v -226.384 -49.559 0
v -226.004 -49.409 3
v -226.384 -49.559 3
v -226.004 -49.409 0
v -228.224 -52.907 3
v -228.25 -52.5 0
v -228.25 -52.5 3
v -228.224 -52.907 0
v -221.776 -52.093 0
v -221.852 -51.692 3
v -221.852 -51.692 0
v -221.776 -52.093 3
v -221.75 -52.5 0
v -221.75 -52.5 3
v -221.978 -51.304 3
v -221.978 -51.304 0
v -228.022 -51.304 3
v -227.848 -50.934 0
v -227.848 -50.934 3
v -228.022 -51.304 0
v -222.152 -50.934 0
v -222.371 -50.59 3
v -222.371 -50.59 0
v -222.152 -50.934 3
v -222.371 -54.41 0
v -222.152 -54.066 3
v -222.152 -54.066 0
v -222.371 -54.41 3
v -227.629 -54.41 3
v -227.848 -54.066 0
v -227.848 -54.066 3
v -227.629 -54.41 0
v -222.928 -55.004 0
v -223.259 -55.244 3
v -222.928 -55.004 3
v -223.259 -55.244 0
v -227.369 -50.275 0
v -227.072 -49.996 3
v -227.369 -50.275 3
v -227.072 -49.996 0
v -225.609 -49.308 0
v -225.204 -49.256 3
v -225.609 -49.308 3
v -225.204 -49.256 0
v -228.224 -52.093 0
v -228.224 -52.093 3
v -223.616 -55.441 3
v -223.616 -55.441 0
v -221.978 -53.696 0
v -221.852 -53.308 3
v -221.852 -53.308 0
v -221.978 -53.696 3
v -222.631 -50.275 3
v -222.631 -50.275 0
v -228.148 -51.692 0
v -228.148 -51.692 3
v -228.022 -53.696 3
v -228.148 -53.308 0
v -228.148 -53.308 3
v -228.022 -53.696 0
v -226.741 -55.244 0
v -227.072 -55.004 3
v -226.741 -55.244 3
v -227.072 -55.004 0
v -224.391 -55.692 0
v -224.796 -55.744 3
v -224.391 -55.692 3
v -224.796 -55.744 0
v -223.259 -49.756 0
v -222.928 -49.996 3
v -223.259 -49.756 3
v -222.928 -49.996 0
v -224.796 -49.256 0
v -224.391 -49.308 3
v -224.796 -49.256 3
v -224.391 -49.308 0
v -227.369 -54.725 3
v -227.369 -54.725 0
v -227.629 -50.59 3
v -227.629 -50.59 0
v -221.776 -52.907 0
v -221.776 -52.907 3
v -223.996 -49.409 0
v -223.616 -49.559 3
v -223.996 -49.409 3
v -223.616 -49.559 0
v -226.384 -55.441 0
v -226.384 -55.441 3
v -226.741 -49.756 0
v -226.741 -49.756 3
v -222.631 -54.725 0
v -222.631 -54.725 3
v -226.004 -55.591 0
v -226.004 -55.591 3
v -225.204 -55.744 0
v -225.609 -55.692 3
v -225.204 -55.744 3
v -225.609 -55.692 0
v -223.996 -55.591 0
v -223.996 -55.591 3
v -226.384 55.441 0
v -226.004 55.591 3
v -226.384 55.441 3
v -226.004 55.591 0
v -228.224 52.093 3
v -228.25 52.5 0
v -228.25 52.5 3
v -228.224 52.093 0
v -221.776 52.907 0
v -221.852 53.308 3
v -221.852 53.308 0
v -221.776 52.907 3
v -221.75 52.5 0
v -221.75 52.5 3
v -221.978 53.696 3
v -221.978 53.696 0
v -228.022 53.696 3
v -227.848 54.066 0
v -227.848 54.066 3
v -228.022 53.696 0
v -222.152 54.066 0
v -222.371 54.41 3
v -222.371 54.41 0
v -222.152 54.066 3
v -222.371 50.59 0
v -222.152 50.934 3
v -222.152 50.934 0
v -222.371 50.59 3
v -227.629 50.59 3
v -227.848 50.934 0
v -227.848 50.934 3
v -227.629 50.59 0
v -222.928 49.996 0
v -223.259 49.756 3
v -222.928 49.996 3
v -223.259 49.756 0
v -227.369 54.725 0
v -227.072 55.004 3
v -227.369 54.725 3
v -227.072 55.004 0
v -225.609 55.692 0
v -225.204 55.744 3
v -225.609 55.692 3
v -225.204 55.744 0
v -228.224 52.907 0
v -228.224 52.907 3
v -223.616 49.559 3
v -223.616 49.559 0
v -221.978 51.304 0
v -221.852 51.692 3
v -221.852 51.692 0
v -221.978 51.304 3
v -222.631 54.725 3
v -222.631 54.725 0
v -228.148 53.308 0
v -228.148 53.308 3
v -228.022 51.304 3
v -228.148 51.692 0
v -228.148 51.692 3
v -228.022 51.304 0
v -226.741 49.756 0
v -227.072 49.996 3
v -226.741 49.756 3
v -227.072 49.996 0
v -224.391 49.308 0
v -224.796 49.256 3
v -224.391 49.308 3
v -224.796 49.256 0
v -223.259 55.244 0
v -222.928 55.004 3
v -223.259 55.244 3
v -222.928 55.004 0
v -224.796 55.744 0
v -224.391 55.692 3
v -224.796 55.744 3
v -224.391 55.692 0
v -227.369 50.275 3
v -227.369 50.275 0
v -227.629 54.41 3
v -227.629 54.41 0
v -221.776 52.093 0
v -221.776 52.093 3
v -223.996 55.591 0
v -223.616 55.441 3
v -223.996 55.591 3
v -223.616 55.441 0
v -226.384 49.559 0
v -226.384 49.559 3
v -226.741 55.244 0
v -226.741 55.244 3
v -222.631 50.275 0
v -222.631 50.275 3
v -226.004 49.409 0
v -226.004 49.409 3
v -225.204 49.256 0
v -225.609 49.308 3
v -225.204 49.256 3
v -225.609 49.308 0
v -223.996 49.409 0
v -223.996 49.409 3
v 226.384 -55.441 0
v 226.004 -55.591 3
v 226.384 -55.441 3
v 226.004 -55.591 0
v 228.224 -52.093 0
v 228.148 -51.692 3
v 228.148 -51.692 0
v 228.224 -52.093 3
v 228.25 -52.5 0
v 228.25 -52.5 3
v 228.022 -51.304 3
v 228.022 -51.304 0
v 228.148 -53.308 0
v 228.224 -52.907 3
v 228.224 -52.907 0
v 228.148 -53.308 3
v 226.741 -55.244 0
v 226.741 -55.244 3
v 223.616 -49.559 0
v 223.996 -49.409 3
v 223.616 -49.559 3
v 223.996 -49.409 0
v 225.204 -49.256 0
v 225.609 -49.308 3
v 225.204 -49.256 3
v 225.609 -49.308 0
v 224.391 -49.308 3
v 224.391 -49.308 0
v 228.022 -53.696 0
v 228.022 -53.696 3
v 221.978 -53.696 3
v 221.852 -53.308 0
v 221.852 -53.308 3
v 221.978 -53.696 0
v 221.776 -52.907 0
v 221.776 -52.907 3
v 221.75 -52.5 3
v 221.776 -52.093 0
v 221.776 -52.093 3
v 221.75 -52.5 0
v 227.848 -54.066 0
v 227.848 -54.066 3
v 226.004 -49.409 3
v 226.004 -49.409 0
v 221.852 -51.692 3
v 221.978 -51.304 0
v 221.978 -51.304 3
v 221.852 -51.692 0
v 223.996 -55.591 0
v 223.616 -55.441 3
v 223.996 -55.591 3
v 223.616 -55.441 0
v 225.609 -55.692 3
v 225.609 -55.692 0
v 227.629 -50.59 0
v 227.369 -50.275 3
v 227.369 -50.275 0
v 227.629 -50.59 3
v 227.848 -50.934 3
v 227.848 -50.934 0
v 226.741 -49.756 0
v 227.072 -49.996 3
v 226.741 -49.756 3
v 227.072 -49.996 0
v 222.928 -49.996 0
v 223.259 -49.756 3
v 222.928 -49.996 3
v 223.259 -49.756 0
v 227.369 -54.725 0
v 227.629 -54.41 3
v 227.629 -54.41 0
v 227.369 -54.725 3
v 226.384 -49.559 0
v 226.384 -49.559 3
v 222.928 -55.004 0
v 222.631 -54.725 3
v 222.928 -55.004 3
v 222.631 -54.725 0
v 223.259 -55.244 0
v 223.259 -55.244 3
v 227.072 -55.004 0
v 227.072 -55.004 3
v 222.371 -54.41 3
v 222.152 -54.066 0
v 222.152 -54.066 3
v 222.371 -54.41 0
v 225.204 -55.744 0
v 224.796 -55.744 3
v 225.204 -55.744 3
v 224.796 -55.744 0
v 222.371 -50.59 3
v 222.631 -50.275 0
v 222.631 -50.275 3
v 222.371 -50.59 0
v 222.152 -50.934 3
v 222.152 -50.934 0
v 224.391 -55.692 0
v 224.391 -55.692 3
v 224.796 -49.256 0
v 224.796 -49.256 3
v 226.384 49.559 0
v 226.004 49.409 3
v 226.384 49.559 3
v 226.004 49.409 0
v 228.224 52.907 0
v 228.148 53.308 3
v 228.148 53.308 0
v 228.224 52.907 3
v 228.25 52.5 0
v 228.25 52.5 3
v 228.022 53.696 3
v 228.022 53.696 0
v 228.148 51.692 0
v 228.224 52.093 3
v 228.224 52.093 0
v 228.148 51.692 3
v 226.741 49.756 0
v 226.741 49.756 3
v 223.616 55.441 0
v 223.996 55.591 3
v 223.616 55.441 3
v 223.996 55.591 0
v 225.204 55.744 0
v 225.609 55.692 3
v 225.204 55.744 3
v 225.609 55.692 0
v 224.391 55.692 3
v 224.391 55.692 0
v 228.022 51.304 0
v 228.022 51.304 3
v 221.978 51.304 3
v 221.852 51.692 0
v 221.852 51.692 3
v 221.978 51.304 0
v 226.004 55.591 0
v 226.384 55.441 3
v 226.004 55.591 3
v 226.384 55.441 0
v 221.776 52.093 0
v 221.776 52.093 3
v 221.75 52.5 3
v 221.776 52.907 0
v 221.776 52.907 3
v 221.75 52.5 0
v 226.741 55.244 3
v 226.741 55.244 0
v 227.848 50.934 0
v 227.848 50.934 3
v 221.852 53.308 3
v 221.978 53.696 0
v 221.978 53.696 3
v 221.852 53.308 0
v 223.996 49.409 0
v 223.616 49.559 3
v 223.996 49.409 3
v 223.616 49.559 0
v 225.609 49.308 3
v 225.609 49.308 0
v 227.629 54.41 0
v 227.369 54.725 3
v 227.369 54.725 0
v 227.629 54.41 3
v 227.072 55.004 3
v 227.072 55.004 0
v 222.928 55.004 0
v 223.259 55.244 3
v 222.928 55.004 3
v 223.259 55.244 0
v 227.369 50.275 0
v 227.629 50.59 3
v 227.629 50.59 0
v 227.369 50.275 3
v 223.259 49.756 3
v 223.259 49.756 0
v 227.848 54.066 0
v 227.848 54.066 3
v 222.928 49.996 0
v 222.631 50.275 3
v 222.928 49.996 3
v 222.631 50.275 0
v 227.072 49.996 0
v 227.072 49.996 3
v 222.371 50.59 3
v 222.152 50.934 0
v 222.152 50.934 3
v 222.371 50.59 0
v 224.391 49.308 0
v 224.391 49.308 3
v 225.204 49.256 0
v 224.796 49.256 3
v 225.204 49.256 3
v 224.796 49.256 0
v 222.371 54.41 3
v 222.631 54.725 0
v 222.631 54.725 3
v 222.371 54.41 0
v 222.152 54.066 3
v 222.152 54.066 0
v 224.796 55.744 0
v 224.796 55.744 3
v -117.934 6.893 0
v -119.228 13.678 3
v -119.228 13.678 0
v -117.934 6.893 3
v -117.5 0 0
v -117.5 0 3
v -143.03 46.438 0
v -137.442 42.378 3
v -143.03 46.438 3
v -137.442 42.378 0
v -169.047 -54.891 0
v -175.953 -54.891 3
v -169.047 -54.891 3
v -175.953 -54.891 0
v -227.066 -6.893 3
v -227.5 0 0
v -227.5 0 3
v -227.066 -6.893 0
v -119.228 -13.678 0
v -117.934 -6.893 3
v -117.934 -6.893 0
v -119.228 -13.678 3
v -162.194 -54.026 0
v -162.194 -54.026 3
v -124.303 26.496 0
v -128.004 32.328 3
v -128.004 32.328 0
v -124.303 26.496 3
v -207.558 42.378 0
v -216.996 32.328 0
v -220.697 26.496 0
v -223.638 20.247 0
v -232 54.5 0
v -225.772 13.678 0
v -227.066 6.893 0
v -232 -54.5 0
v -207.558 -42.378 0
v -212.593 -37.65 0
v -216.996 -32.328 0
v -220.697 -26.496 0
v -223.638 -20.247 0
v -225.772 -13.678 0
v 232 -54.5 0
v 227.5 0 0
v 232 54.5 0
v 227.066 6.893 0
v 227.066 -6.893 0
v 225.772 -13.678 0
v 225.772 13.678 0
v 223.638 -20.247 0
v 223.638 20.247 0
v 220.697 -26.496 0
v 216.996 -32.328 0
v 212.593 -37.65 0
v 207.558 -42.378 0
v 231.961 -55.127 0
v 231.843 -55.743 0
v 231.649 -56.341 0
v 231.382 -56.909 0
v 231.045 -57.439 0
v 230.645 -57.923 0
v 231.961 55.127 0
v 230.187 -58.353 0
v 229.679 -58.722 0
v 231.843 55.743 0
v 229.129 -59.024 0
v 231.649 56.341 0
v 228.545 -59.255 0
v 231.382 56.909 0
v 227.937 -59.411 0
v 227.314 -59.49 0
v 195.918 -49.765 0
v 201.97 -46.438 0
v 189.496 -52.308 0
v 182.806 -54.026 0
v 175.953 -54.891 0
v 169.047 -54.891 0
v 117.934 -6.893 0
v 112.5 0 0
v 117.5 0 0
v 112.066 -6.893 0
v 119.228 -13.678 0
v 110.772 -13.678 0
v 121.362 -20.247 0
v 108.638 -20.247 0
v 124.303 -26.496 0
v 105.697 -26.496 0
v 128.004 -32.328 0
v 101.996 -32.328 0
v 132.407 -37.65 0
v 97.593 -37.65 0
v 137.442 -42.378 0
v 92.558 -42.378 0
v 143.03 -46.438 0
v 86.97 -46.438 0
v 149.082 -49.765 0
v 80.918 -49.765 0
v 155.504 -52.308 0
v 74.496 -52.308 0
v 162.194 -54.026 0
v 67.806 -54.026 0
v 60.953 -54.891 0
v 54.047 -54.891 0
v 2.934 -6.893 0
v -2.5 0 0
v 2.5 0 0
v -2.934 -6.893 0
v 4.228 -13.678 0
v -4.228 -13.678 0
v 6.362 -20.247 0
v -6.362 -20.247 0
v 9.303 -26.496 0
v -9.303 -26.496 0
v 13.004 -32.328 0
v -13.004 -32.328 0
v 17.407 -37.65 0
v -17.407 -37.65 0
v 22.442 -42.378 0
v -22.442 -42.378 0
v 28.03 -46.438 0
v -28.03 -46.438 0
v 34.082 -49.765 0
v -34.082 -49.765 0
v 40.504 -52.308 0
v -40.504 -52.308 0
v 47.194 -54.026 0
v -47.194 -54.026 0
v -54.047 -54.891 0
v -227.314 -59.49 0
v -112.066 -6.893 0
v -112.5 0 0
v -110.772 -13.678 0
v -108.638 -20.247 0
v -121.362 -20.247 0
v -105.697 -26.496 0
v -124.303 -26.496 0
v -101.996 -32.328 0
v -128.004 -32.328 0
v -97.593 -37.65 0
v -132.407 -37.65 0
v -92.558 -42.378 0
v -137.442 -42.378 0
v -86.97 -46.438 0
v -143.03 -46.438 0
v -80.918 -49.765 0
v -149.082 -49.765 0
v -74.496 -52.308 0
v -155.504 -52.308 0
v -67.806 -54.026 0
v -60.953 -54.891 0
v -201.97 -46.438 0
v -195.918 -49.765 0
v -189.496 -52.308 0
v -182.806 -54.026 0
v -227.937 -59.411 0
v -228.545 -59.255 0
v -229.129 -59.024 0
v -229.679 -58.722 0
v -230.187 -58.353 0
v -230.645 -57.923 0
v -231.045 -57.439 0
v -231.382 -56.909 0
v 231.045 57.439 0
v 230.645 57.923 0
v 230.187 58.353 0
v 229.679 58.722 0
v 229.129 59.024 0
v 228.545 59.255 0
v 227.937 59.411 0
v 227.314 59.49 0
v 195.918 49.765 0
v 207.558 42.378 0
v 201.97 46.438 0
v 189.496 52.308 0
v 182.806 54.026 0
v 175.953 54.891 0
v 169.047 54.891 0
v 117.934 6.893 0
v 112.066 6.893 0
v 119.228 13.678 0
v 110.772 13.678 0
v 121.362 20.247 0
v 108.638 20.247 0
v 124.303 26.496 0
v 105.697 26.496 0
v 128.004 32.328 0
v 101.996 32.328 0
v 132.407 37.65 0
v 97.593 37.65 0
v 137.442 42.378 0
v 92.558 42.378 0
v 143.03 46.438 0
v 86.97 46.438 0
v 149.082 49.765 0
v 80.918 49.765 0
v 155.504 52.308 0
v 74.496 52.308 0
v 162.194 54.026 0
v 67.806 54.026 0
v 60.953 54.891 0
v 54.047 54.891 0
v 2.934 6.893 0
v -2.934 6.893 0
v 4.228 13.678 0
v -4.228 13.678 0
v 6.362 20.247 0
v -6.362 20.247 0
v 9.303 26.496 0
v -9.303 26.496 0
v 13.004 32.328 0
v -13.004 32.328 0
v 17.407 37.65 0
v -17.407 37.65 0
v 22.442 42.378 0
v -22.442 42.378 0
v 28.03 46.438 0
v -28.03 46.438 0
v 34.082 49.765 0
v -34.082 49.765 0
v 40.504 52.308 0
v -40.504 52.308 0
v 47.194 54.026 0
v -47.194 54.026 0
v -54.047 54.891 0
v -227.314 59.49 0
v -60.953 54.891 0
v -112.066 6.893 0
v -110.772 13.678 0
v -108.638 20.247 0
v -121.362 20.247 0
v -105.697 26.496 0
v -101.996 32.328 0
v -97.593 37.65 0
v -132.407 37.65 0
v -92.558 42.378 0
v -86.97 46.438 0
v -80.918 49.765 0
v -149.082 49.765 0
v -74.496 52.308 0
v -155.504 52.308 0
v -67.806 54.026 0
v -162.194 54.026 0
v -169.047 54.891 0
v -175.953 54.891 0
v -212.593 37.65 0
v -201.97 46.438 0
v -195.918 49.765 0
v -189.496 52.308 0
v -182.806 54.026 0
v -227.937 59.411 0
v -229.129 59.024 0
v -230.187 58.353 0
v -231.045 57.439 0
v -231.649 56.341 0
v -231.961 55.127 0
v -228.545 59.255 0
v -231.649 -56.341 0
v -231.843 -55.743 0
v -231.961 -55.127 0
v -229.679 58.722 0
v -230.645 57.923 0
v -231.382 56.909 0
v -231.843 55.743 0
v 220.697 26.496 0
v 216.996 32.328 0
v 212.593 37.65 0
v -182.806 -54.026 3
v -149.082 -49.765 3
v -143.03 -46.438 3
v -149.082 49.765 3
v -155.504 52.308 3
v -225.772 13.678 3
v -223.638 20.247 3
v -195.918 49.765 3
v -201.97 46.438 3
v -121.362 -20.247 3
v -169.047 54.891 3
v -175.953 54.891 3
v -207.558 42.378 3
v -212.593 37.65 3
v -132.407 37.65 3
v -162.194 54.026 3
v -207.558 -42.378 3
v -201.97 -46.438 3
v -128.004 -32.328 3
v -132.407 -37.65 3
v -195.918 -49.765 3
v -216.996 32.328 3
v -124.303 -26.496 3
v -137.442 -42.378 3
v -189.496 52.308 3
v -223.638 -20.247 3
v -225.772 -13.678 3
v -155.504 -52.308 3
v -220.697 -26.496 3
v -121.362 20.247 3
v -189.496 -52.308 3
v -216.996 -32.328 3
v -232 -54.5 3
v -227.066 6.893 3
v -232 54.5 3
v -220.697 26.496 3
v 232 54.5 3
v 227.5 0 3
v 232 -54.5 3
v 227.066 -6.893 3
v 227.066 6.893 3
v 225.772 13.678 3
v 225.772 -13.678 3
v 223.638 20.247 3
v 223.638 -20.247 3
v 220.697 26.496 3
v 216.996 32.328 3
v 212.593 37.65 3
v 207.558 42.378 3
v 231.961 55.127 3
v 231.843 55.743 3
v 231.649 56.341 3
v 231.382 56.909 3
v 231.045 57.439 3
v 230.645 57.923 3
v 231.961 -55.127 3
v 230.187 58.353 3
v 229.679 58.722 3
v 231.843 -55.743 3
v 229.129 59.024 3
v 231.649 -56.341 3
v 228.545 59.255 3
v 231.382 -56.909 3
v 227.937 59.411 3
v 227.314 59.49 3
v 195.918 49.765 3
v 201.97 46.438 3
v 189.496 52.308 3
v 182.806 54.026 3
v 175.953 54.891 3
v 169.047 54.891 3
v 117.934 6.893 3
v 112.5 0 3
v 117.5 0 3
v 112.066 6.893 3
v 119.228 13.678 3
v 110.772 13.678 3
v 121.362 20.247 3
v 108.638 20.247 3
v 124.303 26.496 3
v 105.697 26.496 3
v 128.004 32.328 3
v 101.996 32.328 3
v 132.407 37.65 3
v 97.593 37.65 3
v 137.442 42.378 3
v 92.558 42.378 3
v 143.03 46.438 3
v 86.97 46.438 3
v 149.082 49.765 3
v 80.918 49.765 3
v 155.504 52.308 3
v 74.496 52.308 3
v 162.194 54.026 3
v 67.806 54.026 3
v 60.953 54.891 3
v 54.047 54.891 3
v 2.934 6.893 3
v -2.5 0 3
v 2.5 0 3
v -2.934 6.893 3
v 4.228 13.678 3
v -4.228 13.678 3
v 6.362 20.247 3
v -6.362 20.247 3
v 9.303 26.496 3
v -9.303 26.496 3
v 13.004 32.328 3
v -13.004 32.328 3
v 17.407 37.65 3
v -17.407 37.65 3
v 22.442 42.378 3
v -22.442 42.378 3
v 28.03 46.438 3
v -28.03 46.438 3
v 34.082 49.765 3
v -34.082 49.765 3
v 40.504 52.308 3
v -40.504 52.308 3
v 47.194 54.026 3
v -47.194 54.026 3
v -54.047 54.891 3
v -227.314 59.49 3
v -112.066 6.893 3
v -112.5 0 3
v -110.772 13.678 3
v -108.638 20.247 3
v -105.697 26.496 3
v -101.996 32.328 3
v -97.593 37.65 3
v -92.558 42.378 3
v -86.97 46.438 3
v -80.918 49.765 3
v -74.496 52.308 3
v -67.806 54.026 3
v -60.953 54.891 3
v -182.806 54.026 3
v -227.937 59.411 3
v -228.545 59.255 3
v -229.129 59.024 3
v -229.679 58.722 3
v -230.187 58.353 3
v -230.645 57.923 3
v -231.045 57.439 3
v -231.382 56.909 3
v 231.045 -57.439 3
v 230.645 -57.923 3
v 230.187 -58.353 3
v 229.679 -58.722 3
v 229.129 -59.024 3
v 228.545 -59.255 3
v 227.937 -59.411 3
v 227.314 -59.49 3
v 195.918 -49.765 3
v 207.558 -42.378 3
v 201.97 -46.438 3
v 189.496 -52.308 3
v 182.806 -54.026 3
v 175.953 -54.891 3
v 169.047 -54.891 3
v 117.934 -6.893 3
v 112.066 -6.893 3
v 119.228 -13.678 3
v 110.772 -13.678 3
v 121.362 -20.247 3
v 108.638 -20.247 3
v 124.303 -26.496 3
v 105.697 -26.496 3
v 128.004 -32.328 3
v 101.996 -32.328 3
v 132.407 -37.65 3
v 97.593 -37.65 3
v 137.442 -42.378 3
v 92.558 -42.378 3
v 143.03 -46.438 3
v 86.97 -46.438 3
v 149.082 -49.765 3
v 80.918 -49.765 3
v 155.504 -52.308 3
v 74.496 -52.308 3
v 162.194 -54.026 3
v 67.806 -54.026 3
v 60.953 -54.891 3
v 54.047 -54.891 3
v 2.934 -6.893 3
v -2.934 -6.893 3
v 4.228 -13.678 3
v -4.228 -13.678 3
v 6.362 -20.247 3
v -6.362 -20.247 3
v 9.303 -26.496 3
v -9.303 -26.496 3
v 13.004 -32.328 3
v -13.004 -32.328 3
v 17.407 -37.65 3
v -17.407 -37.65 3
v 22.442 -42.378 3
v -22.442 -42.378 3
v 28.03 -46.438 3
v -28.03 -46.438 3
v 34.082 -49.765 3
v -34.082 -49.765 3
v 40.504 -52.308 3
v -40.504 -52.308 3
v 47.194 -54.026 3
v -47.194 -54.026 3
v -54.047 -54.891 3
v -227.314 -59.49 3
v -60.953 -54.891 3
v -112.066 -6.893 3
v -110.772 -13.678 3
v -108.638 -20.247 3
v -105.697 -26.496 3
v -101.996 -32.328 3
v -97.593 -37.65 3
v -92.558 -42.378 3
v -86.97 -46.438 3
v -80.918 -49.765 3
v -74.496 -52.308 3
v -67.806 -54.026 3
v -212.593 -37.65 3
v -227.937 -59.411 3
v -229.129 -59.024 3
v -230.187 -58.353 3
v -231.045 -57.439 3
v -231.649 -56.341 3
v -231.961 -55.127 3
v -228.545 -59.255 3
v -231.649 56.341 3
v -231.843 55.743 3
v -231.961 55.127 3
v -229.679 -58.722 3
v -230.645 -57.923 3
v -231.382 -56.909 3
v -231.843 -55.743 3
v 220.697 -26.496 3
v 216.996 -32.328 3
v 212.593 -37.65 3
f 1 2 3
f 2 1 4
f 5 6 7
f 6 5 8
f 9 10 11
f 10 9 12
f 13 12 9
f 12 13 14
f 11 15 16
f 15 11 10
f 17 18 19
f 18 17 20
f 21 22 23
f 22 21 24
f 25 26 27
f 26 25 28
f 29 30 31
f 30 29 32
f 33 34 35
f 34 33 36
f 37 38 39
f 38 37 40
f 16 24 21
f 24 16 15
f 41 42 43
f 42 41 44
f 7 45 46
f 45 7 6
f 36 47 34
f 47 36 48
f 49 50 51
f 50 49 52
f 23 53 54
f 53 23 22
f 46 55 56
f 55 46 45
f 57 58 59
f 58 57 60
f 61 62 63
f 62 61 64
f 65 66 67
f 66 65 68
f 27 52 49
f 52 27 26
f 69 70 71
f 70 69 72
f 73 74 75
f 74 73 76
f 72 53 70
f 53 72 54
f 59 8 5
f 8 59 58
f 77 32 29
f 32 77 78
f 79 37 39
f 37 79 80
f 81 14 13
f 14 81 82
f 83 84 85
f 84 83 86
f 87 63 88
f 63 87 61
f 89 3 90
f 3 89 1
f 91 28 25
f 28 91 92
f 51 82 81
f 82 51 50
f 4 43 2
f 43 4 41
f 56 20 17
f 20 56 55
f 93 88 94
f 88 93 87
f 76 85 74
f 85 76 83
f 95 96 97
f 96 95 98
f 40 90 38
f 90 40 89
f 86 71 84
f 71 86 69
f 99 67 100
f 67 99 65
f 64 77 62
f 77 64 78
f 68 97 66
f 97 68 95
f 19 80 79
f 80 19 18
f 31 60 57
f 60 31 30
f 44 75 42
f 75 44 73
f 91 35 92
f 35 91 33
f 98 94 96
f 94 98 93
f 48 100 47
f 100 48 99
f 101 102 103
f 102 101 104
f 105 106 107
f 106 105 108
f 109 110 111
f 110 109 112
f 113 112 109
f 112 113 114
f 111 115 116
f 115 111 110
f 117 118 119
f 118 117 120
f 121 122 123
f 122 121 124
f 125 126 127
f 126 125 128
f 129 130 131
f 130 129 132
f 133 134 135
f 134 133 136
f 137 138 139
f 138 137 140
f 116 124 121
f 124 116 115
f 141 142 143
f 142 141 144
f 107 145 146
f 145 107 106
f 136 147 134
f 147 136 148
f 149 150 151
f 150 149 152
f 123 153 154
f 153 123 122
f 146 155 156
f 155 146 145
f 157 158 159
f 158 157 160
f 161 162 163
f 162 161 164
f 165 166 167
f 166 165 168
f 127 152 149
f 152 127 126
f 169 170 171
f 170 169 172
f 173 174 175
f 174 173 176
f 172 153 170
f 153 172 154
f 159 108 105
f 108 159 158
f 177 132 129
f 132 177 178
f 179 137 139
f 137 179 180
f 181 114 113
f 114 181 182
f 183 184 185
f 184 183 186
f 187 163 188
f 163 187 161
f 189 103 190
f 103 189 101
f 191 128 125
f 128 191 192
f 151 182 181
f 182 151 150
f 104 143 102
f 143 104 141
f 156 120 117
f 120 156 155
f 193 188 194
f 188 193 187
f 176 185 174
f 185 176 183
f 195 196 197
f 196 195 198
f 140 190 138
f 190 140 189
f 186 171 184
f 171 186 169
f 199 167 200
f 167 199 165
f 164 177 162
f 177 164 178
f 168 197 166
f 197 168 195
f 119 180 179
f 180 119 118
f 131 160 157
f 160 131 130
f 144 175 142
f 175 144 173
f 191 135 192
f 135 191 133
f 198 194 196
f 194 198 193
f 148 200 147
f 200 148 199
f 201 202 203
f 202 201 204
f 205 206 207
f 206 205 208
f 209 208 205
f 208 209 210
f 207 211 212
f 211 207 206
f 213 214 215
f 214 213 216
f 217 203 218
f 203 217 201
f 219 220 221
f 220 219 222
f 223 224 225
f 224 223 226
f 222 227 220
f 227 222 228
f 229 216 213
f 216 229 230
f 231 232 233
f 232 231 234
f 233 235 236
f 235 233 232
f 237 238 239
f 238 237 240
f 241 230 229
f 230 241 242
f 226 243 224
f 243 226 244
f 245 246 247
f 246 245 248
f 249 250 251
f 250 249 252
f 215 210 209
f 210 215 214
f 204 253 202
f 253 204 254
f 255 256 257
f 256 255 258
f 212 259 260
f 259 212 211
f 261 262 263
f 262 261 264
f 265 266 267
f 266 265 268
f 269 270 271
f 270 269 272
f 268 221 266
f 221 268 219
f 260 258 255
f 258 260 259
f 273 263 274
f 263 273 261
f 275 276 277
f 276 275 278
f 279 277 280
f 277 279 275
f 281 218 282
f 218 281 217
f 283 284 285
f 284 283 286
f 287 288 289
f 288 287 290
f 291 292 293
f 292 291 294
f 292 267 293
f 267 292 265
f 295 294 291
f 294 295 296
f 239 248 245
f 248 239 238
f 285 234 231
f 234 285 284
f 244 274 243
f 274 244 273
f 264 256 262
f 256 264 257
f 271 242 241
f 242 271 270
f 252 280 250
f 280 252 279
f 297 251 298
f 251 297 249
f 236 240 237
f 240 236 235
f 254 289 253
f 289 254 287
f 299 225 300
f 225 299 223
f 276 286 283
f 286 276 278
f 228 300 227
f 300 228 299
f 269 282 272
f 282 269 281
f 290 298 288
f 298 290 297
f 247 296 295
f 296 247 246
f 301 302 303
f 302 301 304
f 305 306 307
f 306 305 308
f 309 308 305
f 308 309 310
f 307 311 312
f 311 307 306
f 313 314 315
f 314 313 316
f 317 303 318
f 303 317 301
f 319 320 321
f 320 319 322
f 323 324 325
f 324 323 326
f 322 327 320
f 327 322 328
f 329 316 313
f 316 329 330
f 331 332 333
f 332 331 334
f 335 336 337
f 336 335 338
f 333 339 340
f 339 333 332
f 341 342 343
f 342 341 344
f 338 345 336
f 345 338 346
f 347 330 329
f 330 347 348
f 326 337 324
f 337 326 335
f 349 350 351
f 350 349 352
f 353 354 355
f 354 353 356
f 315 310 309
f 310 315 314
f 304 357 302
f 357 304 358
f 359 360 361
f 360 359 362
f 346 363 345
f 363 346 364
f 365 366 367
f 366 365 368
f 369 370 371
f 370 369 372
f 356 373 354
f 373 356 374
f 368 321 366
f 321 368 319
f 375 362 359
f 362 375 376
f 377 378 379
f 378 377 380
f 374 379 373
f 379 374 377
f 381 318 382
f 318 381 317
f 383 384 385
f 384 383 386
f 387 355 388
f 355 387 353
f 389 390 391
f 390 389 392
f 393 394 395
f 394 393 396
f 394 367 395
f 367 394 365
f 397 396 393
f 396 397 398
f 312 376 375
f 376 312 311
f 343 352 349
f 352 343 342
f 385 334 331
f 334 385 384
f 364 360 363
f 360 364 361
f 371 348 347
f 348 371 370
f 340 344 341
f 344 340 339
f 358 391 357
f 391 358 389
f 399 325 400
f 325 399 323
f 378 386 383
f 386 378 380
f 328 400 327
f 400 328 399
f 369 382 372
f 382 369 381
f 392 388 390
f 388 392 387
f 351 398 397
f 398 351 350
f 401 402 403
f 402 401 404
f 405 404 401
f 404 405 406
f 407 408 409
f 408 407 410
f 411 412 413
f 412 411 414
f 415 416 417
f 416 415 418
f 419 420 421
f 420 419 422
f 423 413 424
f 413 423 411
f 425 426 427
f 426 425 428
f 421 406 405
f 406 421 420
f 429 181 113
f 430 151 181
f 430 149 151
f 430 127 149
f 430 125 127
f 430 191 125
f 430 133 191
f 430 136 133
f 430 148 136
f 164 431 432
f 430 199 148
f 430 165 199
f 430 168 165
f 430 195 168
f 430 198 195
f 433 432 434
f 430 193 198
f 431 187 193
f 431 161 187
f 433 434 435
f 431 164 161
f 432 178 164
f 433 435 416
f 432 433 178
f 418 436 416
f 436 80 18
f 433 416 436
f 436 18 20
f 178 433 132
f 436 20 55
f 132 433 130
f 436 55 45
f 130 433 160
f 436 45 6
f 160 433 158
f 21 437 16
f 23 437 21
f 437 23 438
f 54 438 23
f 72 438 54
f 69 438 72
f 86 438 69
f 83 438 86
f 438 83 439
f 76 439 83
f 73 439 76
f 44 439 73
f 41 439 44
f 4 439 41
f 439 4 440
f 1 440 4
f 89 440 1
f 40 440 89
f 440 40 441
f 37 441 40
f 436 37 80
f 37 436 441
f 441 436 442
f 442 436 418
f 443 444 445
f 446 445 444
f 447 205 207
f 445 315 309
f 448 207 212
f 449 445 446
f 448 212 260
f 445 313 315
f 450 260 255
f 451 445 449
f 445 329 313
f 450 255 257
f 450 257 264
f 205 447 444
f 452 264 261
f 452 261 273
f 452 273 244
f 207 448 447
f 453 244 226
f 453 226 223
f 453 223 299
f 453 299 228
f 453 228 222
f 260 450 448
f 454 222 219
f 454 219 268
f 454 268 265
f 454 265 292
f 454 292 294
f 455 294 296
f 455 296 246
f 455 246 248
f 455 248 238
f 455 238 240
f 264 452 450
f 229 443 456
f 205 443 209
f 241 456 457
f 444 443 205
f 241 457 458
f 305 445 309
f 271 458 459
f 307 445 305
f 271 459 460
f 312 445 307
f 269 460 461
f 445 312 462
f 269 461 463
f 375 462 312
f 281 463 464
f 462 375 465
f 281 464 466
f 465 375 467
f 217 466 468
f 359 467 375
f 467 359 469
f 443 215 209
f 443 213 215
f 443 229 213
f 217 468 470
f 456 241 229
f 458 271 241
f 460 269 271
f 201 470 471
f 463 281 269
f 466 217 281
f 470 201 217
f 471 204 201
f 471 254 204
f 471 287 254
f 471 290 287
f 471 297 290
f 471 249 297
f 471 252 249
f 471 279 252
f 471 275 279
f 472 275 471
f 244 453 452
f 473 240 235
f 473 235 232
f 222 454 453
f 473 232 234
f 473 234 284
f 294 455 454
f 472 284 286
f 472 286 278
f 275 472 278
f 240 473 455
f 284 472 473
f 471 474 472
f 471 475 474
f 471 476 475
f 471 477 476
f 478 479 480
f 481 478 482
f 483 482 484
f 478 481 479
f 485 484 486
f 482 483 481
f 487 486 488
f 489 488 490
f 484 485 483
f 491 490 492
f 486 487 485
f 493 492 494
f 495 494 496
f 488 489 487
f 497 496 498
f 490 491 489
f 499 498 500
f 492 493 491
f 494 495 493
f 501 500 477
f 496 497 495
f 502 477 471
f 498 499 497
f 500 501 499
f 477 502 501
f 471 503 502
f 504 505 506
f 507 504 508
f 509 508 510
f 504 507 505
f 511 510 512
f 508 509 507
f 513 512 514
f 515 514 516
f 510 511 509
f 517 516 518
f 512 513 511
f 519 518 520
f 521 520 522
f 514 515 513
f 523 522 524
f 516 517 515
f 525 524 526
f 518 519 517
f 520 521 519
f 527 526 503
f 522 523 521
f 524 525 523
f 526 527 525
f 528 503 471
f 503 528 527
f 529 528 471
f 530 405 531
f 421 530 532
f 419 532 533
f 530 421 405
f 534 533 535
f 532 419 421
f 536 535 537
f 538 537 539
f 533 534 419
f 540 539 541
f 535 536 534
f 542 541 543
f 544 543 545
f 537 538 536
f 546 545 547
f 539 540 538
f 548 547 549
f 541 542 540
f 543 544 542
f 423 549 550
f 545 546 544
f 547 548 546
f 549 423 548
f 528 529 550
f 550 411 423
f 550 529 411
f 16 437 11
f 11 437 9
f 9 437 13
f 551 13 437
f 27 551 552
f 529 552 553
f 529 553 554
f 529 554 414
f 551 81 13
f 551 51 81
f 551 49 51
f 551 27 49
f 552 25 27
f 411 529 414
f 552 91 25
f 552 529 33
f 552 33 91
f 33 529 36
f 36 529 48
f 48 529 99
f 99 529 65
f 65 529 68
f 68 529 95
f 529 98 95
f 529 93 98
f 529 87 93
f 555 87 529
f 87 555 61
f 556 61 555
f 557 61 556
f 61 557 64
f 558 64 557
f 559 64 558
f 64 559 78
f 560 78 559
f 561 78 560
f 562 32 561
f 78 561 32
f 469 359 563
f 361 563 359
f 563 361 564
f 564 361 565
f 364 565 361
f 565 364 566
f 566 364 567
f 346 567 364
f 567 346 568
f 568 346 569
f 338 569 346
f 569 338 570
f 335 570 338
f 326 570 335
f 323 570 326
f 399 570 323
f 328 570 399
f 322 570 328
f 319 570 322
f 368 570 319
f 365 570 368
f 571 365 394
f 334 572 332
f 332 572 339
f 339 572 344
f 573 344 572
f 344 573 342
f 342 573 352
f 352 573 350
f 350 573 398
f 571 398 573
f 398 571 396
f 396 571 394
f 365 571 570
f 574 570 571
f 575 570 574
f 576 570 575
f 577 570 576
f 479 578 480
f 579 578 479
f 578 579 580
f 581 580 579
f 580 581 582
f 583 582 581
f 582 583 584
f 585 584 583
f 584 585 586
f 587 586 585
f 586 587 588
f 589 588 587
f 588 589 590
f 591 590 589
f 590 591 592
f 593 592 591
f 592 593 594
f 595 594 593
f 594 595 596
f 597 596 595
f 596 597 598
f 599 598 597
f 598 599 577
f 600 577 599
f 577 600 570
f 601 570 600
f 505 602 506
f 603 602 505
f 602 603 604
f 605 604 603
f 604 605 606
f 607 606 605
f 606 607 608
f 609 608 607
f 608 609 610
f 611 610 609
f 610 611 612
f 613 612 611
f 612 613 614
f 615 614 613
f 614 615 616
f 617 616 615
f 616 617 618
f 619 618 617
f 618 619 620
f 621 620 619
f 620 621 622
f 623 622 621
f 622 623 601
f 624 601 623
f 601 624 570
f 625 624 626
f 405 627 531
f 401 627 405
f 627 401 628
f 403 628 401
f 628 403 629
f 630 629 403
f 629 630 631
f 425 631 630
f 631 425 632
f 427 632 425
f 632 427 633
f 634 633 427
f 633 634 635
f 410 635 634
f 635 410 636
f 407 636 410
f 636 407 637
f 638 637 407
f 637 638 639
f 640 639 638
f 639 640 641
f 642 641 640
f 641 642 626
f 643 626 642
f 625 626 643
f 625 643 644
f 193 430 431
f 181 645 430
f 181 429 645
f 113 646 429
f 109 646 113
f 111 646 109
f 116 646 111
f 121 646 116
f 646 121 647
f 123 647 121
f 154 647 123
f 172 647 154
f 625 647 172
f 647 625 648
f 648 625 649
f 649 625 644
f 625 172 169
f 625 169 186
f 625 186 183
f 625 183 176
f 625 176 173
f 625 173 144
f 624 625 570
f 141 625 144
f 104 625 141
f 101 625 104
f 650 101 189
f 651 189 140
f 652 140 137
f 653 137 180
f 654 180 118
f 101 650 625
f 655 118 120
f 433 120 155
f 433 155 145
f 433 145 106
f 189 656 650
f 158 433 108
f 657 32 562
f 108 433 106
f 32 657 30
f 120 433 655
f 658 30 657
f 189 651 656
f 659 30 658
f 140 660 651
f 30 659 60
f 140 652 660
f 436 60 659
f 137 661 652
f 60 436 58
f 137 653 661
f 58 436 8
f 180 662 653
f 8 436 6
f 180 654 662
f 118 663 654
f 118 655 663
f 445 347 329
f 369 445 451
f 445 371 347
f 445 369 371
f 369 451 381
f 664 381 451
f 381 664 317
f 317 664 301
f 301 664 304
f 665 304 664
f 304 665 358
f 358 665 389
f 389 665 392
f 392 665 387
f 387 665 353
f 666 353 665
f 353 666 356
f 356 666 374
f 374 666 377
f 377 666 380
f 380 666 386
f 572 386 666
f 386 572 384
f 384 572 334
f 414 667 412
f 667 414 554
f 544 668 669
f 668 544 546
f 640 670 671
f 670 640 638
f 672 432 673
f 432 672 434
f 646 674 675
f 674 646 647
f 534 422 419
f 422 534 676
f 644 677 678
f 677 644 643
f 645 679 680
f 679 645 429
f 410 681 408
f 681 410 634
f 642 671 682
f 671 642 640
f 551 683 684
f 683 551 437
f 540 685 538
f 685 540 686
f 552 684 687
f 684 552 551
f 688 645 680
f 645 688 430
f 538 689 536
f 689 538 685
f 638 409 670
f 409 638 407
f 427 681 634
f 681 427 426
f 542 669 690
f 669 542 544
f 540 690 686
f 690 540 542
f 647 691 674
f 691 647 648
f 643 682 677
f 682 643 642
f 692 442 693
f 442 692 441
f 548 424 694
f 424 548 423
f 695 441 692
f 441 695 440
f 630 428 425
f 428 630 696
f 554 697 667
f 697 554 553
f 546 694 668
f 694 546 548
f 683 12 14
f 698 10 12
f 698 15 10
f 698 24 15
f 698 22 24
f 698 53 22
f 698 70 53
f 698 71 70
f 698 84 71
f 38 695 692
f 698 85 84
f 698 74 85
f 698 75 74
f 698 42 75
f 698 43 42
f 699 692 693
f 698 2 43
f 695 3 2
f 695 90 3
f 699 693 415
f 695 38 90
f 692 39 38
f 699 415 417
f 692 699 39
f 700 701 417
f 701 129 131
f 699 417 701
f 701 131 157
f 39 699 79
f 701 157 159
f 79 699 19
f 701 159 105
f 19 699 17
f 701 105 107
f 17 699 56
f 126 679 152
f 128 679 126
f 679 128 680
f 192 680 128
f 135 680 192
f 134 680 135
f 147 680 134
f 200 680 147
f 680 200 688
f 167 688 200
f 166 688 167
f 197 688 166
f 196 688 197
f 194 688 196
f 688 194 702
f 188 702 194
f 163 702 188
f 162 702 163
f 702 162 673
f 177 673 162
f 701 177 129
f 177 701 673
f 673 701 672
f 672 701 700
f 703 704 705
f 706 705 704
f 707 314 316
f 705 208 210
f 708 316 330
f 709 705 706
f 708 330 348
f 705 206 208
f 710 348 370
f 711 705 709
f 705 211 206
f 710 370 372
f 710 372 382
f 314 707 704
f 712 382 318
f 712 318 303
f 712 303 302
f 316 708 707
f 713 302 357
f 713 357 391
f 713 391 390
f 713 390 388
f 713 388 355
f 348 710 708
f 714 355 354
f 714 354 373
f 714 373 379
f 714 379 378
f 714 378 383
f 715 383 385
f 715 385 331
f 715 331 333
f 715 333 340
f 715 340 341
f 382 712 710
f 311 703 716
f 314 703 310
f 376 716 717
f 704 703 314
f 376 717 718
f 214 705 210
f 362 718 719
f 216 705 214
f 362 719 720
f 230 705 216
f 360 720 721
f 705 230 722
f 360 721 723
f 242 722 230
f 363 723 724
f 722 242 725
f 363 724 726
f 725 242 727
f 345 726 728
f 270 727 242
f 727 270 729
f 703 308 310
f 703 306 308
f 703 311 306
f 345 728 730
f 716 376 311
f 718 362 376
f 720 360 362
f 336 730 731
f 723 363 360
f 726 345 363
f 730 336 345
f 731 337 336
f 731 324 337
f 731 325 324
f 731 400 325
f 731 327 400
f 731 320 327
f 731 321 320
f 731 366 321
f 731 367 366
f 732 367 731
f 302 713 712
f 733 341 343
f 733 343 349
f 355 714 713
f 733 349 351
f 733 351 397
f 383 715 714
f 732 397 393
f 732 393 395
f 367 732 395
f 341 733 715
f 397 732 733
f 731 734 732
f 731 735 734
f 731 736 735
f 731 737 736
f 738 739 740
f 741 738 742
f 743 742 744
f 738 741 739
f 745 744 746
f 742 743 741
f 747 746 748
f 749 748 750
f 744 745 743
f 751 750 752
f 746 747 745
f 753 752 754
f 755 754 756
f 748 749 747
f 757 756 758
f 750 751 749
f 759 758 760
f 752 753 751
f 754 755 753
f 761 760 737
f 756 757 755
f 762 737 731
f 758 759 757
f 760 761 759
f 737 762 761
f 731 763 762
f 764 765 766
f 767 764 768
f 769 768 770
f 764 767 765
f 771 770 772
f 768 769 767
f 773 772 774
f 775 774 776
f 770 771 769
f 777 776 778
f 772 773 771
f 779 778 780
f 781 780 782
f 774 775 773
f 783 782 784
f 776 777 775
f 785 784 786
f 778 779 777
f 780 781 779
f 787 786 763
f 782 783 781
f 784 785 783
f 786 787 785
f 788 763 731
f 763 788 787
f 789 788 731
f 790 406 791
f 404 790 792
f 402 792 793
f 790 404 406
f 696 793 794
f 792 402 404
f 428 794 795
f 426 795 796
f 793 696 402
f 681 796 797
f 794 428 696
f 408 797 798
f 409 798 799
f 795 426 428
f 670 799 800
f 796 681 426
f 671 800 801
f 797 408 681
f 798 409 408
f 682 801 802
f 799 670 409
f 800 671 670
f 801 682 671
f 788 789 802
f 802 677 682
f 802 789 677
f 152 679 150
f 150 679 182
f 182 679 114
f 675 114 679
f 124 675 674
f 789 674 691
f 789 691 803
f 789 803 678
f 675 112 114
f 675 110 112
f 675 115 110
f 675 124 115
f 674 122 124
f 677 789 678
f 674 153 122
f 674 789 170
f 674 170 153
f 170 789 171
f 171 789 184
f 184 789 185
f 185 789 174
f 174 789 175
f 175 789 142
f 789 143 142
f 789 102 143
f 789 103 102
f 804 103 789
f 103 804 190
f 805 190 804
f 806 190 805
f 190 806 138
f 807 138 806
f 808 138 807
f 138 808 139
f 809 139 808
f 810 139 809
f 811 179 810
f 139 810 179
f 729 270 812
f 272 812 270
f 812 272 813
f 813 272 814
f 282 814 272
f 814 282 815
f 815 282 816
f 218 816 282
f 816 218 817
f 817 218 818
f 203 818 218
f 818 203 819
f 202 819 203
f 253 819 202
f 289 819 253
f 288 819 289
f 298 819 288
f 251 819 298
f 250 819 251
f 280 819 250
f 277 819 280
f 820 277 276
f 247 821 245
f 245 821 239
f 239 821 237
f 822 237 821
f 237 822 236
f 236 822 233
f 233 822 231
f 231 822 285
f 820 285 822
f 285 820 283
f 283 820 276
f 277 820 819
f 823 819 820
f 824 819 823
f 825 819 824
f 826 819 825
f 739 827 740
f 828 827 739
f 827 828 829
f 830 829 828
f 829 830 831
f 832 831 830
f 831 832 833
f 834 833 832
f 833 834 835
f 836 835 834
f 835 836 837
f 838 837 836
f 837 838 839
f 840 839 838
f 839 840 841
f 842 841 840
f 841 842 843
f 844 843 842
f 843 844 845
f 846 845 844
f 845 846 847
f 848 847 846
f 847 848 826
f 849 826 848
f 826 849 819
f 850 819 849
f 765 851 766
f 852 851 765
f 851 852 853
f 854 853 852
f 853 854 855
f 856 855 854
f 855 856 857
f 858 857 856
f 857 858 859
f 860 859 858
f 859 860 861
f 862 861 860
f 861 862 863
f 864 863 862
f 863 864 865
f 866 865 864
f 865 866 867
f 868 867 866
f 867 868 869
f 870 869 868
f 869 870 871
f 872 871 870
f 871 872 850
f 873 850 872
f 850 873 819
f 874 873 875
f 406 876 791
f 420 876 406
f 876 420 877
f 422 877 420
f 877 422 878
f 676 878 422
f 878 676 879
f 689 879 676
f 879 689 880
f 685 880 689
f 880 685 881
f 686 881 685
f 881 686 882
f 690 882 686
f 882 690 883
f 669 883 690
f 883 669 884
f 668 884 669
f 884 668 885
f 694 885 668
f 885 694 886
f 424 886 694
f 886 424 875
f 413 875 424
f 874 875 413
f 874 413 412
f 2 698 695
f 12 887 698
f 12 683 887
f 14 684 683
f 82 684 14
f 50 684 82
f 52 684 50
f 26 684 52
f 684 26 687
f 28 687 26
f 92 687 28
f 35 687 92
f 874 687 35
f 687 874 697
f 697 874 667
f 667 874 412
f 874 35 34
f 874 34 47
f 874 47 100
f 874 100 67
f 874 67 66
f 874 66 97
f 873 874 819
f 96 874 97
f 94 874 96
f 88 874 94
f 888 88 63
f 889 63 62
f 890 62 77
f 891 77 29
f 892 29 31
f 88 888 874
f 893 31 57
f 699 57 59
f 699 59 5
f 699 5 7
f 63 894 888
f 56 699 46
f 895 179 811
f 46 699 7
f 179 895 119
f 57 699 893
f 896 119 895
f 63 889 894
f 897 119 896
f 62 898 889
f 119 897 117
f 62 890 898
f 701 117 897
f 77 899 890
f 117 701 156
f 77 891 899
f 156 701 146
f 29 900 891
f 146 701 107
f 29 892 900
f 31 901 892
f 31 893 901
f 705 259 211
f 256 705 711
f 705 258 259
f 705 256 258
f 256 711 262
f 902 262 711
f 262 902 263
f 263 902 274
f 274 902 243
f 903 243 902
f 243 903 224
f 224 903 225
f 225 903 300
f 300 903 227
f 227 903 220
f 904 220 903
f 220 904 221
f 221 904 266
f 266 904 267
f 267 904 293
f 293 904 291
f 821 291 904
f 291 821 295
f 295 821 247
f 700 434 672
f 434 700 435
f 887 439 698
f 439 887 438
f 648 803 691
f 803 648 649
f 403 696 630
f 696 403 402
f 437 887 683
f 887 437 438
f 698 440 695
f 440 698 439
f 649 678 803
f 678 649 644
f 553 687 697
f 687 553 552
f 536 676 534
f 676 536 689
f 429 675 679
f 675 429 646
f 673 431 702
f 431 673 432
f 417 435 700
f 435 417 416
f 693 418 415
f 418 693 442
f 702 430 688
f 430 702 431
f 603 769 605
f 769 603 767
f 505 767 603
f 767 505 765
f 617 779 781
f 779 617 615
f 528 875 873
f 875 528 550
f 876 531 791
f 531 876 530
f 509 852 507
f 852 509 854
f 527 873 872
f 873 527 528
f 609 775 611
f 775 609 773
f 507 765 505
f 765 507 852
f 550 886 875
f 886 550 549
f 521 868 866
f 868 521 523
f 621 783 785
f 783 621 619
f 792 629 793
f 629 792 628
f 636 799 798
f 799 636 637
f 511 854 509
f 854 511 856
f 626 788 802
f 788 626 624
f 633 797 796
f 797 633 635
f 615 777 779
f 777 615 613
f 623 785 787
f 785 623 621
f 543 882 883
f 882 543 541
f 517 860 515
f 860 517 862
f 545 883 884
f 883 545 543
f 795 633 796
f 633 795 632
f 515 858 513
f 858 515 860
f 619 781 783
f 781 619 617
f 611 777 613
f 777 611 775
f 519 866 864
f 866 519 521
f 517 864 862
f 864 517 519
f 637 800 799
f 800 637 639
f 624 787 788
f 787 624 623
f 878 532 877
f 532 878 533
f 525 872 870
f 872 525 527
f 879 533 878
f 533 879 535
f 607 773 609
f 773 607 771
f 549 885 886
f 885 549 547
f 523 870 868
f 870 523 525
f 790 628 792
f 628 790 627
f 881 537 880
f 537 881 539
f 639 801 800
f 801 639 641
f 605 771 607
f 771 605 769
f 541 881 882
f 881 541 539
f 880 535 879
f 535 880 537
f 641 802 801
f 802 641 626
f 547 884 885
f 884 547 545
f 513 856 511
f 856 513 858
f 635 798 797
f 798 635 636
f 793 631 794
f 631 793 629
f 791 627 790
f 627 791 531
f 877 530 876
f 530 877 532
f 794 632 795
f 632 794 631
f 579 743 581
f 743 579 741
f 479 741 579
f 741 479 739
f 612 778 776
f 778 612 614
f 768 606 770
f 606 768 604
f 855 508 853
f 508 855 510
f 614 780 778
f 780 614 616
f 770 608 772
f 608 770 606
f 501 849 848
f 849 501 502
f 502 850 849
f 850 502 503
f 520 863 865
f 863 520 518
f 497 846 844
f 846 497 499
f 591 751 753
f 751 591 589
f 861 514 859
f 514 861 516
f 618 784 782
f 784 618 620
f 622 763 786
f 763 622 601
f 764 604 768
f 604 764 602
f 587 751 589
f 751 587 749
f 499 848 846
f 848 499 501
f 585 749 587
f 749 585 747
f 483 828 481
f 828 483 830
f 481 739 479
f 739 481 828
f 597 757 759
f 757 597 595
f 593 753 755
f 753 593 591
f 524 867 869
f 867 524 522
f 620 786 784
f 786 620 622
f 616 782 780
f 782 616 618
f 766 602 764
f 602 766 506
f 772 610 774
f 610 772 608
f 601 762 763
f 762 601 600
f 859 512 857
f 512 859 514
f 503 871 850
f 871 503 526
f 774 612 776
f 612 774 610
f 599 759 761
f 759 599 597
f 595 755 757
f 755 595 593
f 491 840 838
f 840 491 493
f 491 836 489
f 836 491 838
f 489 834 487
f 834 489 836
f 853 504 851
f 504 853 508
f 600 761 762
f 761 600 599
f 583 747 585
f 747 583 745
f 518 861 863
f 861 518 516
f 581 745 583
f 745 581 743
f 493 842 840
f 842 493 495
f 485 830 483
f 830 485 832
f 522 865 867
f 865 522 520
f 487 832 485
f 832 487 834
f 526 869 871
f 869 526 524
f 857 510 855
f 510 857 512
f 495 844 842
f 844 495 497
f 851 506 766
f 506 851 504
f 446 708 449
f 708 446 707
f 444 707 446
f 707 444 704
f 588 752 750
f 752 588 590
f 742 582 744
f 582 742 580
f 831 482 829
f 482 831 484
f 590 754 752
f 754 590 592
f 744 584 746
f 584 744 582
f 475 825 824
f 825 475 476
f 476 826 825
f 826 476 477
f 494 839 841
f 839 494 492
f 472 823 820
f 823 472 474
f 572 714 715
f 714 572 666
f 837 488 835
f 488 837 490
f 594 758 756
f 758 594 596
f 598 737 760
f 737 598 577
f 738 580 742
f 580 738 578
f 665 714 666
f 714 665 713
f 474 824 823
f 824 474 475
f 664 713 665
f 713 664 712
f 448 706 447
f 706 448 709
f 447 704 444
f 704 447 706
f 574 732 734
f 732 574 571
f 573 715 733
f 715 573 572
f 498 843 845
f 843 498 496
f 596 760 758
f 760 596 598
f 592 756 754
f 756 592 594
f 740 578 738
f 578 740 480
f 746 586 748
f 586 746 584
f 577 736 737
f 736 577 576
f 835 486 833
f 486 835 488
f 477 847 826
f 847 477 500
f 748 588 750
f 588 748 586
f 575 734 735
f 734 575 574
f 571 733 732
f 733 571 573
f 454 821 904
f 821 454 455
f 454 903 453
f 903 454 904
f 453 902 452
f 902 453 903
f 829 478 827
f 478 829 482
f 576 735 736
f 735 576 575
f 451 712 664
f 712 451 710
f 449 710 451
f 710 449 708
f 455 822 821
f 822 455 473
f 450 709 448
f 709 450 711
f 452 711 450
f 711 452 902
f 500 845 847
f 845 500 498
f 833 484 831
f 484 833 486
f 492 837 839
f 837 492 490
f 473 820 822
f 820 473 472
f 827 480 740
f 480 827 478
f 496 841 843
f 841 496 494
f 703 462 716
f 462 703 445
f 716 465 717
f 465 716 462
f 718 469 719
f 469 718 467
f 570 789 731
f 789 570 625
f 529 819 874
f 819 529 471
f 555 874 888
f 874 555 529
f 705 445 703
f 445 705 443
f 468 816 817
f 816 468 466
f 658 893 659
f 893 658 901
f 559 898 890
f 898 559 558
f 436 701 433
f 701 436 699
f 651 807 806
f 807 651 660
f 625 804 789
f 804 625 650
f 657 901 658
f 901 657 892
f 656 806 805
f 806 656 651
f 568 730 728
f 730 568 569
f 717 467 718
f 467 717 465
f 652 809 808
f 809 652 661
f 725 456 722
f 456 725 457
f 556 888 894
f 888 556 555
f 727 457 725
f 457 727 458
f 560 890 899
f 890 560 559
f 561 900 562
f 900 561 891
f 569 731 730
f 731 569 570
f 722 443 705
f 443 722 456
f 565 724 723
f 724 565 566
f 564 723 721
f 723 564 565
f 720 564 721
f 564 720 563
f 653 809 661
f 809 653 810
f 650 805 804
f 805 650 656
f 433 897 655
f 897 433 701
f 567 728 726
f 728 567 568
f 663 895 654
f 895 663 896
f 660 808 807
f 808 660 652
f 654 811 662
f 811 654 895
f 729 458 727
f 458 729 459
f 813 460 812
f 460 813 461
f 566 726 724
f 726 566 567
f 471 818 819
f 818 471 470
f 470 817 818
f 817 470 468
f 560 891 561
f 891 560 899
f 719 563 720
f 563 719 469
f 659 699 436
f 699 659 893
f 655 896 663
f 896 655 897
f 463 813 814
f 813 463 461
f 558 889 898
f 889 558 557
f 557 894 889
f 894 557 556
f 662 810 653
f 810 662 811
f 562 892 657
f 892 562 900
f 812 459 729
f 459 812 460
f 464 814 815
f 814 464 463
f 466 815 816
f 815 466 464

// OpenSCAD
$fn = 50;


difference() {
	union() {
		hull() {
			translate(v = [-227.0000000000, 54.5000000000, 0]) {
				cylinder(h = 3, r = 5);
			}
			translate(v = [227.0000000000, 54.5000000000, 0]) {
				cylinder(h = 3, r = 5);
			}
			translate(v = [-227.0000000000, -54.5000000000, 0]) {
				cylinder(h = 3, r = 5);
			}
			translate(v = [227.0000000000, -54.5000000000, 0]) {
				cylinder(h = 3, r = 5);
			}
		}
	}
	union() {
		#translate(v = [-225.0000000000, -52.5000000000, -100.0000000000]) {
			cylinder(h = 200, r = 3.2500000000);
		}
		#translate(v = [-225.0000000000, 52.5000000000, -100.0000000000]) {
			cylinder(h = 200, r = 3.2500000000);
		}
		#translate(v = [225.0000000000, -52.5000000000, -100.0000000000]) {
			cylinder(h = 200, r = 3.2500000000);
		}
		#translate(v = [225.0000000000, 52.5000000000, -100.0000000000]) {
			cylinder(h = 200, r = 3.2500000000);
		}
		#translate(v = [-172.5000000000, 0, 0]) {
			cylinder(h = 3, r = 55.0000000000);
		}
		#translate(v = [-57.5000000000, 0, 0]) {
			cylinder(h = 3, r = 55.0000000000);
		}
		#translate(v = [57.5000000000, 0, 0]) {
			cylinder(h = 3, r = 55.0000000000);
		}
		#translate(v = [172.5000000000, 0, 0]) {
			cylinder(h = 3, r = 55.0000000000);
		}
	}
}
